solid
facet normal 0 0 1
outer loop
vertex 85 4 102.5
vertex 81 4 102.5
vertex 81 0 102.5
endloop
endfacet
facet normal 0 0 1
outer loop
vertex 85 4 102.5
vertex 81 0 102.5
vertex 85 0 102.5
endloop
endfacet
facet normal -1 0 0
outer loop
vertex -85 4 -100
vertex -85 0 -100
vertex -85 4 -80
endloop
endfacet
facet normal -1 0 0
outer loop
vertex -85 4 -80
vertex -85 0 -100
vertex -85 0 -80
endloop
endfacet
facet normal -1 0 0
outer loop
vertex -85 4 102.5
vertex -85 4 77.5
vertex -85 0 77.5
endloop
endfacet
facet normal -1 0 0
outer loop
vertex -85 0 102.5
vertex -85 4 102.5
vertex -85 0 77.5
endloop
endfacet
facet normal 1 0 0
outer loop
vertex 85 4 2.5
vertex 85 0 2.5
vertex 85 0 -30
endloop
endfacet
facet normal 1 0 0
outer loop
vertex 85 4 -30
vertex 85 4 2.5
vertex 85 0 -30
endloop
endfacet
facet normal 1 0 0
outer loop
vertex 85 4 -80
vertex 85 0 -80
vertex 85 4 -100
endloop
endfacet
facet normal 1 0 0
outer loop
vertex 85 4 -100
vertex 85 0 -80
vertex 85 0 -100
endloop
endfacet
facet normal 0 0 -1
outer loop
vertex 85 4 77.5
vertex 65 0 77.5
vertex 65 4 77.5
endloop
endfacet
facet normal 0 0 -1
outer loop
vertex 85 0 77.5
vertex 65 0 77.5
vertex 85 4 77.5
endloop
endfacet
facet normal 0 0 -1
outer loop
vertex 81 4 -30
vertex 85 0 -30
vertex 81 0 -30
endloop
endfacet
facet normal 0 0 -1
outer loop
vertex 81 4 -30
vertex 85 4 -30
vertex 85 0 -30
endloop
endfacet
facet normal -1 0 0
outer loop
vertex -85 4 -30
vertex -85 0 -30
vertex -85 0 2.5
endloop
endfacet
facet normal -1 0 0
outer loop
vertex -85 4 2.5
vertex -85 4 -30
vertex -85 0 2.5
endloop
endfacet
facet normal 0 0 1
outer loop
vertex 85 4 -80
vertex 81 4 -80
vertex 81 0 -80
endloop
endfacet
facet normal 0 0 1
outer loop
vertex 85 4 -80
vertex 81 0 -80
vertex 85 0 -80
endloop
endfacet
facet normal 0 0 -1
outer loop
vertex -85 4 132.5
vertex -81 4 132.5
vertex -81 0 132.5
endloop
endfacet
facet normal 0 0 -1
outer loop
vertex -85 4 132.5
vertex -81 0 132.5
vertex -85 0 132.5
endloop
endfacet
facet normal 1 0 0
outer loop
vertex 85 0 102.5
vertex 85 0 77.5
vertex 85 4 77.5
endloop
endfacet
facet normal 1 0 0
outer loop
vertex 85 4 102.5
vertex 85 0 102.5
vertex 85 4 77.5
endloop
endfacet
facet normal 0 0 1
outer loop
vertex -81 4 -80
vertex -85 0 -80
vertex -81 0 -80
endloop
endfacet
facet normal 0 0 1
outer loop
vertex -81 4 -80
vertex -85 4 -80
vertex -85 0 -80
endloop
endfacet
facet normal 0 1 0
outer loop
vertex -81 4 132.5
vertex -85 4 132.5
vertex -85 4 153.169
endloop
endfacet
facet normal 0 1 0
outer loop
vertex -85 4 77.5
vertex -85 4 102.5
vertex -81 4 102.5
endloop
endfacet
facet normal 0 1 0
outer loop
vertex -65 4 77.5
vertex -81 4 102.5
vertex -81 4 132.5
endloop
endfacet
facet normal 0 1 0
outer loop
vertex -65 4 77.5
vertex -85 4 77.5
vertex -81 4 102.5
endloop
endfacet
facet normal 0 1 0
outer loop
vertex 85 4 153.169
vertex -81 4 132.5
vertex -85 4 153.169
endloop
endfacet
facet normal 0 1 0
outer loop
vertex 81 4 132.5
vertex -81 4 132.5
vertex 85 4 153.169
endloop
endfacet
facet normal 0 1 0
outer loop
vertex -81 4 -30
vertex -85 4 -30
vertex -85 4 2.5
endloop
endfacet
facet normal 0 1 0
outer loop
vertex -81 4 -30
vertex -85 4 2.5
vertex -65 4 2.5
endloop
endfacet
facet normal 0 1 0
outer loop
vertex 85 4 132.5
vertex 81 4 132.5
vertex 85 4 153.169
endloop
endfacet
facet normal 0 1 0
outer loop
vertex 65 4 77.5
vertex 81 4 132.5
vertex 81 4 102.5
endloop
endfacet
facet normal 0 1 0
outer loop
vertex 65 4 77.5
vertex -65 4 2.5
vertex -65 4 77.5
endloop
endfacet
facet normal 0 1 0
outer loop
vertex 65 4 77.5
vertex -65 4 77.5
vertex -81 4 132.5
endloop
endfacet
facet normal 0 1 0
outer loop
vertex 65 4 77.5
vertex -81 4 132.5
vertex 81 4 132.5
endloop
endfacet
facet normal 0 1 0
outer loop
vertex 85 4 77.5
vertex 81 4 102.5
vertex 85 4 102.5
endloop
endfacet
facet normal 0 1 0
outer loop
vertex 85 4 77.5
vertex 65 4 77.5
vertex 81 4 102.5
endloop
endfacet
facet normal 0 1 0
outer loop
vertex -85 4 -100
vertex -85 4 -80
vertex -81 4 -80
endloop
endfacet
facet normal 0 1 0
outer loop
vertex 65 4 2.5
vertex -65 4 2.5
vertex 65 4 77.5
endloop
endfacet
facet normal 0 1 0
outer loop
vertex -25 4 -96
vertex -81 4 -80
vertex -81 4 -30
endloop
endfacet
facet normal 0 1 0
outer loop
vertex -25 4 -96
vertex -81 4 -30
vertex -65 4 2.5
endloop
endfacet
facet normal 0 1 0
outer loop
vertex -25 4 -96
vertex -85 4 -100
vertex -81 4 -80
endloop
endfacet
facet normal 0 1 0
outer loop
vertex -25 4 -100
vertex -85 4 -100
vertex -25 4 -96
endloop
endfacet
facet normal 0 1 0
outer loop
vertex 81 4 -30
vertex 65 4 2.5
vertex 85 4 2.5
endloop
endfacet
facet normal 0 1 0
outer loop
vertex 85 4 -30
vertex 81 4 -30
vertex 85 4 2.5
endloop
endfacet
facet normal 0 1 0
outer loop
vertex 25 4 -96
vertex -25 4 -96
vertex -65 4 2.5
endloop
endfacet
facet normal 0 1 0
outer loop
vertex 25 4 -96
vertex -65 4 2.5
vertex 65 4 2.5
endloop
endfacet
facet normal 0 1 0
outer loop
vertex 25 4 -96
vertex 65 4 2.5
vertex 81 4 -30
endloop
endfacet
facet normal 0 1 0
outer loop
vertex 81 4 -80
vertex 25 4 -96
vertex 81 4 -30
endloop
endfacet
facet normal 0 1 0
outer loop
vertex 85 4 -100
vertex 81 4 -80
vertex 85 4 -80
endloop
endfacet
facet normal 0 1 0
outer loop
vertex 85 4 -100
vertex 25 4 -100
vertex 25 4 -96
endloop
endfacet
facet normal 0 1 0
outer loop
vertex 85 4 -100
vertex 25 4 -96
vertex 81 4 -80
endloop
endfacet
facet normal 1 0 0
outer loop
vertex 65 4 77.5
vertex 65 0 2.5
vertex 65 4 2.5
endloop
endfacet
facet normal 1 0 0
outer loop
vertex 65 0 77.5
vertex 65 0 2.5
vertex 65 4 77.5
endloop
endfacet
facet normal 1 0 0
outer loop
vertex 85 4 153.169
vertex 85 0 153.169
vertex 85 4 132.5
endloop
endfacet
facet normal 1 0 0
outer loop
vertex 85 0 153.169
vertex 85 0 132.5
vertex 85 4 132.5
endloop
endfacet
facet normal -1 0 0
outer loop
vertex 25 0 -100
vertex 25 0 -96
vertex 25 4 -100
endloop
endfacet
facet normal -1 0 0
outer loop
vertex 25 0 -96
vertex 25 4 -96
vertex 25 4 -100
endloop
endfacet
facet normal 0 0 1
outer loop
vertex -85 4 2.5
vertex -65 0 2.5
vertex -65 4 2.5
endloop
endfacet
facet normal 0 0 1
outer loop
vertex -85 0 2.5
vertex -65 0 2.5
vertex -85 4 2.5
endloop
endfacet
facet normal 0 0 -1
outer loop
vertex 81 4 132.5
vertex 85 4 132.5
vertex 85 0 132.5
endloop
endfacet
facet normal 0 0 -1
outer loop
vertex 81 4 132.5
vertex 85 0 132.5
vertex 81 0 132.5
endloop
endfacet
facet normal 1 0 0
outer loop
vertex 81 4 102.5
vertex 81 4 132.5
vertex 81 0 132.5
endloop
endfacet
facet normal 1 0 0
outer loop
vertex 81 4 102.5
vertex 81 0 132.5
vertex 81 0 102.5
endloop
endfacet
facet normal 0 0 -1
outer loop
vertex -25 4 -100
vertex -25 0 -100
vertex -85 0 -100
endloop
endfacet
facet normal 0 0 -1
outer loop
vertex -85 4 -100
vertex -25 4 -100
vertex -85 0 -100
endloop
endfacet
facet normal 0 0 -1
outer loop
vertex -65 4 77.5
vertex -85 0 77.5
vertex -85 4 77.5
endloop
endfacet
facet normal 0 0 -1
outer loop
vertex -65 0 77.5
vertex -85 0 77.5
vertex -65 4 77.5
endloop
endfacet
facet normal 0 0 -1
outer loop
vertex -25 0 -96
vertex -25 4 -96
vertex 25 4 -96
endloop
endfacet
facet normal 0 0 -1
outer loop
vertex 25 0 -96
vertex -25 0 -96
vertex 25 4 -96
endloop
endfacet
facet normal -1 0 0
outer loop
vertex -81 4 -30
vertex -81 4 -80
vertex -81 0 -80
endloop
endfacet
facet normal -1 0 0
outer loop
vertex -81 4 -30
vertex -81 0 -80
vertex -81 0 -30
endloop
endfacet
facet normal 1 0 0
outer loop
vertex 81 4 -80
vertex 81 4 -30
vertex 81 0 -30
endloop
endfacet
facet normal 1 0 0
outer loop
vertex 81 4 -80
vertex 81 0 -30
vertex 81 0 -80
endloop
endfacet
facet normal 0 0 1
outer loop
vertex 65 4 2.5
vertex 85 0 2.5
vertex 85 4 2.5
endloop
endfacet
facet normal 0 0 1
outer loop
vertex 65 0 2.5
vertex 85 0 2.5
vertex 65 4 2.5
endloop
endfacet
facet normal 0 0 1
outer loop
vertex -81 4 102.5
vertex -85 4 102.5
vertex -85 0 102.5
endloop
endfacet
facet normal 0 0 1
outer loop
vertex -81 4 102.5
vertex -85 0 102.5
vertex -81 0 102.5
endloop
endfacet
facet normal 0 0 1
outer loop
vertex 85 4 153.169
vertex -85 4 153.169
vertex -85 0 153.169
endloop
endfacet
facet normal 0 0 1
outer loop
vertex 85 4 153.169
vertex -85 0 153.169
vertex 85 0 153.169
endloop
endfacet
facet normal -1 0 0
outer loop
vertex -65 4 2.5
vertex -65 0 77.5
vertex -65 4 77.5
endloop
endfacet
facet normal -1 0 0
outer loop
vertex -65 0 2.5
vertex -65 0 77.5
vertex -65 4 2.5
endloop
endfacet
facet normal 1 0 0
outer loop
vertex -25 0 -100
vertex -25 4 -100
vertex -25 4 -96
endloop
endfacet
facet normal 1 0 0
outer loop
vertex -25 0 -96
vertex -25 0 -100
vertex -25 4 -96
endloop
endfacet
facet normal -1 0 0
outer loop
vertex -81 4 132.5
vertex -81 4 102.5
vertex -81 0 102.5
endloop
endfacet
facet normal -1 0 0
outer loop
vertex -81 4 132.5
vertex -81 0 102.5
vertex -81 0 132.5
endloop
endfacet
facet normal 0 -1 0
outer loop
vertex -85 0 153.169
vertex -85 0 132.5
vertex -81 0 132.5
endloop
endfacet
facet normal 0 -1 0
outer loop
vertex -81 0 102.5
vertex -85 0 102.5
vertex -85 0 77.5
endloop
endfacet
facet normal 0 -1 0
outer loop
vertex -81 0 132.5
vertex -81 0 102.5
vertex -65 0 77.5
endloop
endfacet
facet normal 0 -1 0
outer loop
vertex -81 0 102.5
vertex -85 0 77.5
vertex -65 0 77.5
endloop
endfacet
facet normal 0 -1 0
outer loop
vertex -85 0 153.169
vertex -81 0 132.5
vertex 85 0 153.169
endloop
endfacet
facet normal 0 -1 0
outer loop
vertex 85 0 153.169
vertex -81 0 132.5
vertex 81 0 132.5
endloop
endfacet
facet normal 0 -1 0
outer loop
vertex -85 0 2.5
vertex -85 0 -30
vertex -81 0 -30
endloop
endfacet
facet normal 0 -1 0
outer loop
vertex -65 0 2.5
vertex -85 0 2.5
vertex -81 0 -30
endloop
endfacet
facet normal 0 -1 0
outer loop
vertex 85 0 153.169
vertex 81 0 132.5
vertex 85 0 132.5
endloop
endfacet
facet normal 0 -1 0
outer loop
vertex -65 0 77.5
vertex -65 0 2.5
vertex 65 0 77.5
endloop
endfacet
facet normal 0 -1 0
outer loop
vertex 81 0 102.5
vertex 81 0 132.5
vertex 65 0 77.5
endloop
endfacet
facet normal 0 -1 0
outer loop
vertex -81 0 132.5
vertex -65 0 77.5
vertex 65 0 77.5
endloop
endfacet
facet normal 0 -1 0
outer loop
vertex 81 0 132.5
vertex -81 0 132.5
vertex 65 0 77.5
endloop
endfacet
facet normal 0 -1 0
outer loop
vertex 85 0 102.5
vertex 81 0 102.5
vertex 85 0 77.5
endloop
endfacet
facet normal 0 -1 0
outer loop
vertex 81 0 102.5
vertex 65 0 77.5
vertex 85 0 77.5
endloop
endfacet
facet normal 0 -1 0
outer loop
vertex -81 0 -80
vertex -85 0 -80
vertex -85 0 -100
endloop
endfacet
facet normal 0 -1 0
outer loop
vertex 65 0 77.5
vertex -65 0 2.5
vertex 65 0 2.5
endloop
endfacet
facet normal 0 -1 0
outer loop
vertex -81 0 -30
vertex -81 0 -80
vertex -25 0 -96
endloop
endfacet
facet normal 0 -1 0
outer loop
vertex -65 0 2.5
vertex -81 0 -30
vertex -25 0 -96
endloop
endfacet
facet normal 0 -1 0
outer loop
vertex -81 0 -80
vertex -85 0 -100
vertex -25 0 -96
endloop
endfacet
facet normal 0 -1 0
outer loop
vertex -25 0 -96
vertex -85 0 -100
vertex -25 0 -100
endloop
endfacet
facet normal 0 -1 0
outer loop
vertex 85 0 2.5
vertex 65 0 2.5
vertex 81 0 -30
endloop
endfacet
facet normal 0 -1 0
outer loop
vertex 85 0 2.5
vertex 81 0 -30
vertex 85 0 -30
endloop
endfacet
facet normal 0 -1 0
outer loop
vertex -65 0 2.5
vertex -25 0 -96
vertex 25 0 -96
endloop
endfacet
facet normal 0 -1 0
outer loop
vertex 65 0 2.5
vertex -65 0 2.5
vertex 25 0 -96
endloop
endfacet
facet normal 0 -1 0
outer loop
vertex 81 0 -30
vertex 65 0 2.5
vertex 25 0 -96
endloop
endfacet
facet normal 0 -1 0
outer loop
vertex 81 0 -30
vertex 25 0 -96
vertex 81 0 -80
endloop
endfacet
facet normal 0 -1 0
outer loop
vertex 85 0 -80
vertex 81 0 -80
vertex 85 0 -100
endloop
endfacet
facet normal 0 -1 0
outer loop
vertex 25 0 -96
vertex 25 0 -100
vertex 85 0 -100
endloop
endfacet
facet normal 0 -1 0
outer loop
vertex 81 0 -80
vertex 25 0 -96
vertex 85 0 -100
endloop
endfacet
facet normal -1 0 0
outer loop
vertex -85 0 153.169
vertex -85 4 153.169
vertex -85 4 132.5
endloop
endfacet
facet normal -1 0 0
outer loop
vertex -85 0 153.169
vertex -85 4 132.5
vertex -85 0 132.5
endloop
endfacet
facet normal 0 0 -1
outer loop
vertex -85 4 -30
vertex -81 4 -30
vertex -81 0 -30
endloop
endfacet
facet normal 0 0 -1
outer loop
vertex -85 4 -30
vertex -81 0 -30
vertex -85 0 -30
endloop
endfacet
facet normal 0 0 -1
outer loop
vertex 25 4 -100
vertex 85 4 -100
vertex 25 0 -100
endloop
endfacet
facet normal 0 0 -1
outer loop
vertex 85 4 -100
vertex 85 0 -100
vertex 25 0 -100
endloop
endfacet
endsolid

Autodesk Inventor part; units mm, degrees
ref_plane "YZ Plane" through (0, 0, 0) normal (1, 0, 0) x (0, 1, 0)
ref_plane "XZ Plane" through (0, 0, 0) normal (0, 1, 0) x (-1, 0, 0)
ref_plane "XY Plane" through (0, 0, 0) normal (0, 0, 1) x (1, 0, 0)
sketch "Sketch1" plane through (0, 0, 0) normal (0, 1, 0) x (-1, 0, 0)
  line L0 (85, 100) -> (-85, 100)
  line L1 (-85, 100) -> (-85, -100)
  line L2 (-85, -100) -> (85, -100)
  line L3 (85, -100) -> (85, 100)
  point P0 (0, 0)
  point P1 (0, -100)
  dimension "d0" = 200
  dimension "d1" = 170
  dimension "d15" = 100
  dimension "d16" = 0
extrude "Extrusion1" add sketch "Sketch1" along normal blind 4
sketch "Sketch2" plane through (85, 0, -100) normal (0, 0, -1) x (-1, 0, 0)
  line L0 (0, 4) -> (169.1447, 65.5636)
  line L1 (0, 4) -> (-1.7101, 8.6985)
  line L2 (-1.7101, 8.6985) -> (167.4346, 70.2621)
  line L3 (167.4346, 70.2621) -> (169.1447, 65.5636)
  line L4 (0, 4) -> (-10.9899, 0)
  line L5 (0, 0) -> (170, 0) projected
  line L6 (-10.9899, 0) -> (-12.7, 4.6985)
  line L7 (-12.7, 4.6985) -> (-1.7101, 8.6985)
  point P0 (85, 0)
  dimension "d4" = 180
  dimension "d5" = 5
  dimension "d6" = 20
  dimension "d7" = 20
extrude "Extrusion2" [suppressed]
sketch "Sketch3" plane through (0, 0, 0) normal (0, -1, 0) x (1, 0, 0)
  line L0 (-85, -100) -> (-85, 100) projected
  line L1 (-85, 77.5) -> (-65, 77.5)
  line L2 (-65, 77.5) -> (-65, 2.5)
  line L3 (-65, 2.5) -> (-85, 2.5)
  line L4 (-85, 2.5) -> (-85, 77.5)
  point P0 (0, 0)
  point P1 (-65, 40)
  dimension "d10" = 20
  dimension "d11" = 75
  dimension "d12" = 40
extrude "Extrusion3" cut sketch "Sketch3" against normal through all
mirror "Mirror1" about plane through (0, 0, 0) normal (1, 0, 0) of "Extrusion3"
sketch "Sketch4" plane through (0, 4, 0) normal (0, 1, 0) x (1, 0, 0)
  line L0 (25, 100) -> (-25, 100)
  line L1 (-25, 100) -> (-25, 96)
  line L2 (-25, 96) -> (25, 96)
  line L3 (25, 96) -> (25, 100)
  point P0 (0, 0)
  point P1 (0, 96)
  dimension "d17" = 4
  dimension "d18" = 96
  dimension "d19" = 50
extrude "Extrusion4" cut sketch "Sketch4" against normal through all
sketch "Sketch5" plane through (0, 4, 0) normal (0, 1, 0) x (1, 0, 0)
  line L0 (-85, 100) -> (-85, -2.5) projected
  line L1 (-85, 80) -> (-81, 80)
  line L2 (-81, 80) -> (-81, 30)
  line L3 (-81, 30) -> (-85, 30)
  line L4 (-85, 30) -> (-85, 80)
  line L5 (-85, -100) -> (85, -100) projected
  point P0 (0, 0)
  dimension "d22" = 50
  dimension "d23" = 4
  dimension "d24" = 20
extrude "Extrusion5" cut sketch "Sketch5" against normal through all
mirror "Mirror2" about plane through (0, 0, 0) normal (1, 0, 0) of "Extrusion5"
sketch "Sketch6" plane through (-85, 0, 100) normal (0, 0, 1) x (1, 0, 0)
  line L0 (150, 4) -> (170, 4) projected
  line L1 (0, 0) -> (170, 0)
  line L2 (170, 0) -> (170, 4)
  line L3 (170, 4) -> (0, 4)
  line L4 (0, 4) -> (0, 0)
  point P0 (85, 0)
extrude "Extrusion6" add sketch "Sketch6" along normal blind 53.169
sketch "Sketch7" plane through (0, 4, 0) normal (0, 1, 0) x (1, 0, 0)
  line L0 (-85, -77.5) -> (-85, -153.169) projected
  line L1 (-85, -102.5) -> (-81, -102.5)
  line L2 (-81, -102.5) -> (-81, -132.5)
  line L3 (-81, -132.5) -> (-85, -132.5)
  line L4 (-85, -132.5) -> (-85, -102.5)
  line L5 (-65, -77.5) -> (-85, -77.5) projected
  point P0 (0, 0)
  point P1 (-83, -102.5)
  dimension "d32" = 30
  dimension "d33" = 4
  dimension "d34" = 25
extrude "Extrusion7" cut sketch "Sketch7" against normal blind 10
mirror "Mirror3" about plane through (0, 0, 0) normal (1, 0, 0) of "Extrusion7"
properties part number "Parte inf"
